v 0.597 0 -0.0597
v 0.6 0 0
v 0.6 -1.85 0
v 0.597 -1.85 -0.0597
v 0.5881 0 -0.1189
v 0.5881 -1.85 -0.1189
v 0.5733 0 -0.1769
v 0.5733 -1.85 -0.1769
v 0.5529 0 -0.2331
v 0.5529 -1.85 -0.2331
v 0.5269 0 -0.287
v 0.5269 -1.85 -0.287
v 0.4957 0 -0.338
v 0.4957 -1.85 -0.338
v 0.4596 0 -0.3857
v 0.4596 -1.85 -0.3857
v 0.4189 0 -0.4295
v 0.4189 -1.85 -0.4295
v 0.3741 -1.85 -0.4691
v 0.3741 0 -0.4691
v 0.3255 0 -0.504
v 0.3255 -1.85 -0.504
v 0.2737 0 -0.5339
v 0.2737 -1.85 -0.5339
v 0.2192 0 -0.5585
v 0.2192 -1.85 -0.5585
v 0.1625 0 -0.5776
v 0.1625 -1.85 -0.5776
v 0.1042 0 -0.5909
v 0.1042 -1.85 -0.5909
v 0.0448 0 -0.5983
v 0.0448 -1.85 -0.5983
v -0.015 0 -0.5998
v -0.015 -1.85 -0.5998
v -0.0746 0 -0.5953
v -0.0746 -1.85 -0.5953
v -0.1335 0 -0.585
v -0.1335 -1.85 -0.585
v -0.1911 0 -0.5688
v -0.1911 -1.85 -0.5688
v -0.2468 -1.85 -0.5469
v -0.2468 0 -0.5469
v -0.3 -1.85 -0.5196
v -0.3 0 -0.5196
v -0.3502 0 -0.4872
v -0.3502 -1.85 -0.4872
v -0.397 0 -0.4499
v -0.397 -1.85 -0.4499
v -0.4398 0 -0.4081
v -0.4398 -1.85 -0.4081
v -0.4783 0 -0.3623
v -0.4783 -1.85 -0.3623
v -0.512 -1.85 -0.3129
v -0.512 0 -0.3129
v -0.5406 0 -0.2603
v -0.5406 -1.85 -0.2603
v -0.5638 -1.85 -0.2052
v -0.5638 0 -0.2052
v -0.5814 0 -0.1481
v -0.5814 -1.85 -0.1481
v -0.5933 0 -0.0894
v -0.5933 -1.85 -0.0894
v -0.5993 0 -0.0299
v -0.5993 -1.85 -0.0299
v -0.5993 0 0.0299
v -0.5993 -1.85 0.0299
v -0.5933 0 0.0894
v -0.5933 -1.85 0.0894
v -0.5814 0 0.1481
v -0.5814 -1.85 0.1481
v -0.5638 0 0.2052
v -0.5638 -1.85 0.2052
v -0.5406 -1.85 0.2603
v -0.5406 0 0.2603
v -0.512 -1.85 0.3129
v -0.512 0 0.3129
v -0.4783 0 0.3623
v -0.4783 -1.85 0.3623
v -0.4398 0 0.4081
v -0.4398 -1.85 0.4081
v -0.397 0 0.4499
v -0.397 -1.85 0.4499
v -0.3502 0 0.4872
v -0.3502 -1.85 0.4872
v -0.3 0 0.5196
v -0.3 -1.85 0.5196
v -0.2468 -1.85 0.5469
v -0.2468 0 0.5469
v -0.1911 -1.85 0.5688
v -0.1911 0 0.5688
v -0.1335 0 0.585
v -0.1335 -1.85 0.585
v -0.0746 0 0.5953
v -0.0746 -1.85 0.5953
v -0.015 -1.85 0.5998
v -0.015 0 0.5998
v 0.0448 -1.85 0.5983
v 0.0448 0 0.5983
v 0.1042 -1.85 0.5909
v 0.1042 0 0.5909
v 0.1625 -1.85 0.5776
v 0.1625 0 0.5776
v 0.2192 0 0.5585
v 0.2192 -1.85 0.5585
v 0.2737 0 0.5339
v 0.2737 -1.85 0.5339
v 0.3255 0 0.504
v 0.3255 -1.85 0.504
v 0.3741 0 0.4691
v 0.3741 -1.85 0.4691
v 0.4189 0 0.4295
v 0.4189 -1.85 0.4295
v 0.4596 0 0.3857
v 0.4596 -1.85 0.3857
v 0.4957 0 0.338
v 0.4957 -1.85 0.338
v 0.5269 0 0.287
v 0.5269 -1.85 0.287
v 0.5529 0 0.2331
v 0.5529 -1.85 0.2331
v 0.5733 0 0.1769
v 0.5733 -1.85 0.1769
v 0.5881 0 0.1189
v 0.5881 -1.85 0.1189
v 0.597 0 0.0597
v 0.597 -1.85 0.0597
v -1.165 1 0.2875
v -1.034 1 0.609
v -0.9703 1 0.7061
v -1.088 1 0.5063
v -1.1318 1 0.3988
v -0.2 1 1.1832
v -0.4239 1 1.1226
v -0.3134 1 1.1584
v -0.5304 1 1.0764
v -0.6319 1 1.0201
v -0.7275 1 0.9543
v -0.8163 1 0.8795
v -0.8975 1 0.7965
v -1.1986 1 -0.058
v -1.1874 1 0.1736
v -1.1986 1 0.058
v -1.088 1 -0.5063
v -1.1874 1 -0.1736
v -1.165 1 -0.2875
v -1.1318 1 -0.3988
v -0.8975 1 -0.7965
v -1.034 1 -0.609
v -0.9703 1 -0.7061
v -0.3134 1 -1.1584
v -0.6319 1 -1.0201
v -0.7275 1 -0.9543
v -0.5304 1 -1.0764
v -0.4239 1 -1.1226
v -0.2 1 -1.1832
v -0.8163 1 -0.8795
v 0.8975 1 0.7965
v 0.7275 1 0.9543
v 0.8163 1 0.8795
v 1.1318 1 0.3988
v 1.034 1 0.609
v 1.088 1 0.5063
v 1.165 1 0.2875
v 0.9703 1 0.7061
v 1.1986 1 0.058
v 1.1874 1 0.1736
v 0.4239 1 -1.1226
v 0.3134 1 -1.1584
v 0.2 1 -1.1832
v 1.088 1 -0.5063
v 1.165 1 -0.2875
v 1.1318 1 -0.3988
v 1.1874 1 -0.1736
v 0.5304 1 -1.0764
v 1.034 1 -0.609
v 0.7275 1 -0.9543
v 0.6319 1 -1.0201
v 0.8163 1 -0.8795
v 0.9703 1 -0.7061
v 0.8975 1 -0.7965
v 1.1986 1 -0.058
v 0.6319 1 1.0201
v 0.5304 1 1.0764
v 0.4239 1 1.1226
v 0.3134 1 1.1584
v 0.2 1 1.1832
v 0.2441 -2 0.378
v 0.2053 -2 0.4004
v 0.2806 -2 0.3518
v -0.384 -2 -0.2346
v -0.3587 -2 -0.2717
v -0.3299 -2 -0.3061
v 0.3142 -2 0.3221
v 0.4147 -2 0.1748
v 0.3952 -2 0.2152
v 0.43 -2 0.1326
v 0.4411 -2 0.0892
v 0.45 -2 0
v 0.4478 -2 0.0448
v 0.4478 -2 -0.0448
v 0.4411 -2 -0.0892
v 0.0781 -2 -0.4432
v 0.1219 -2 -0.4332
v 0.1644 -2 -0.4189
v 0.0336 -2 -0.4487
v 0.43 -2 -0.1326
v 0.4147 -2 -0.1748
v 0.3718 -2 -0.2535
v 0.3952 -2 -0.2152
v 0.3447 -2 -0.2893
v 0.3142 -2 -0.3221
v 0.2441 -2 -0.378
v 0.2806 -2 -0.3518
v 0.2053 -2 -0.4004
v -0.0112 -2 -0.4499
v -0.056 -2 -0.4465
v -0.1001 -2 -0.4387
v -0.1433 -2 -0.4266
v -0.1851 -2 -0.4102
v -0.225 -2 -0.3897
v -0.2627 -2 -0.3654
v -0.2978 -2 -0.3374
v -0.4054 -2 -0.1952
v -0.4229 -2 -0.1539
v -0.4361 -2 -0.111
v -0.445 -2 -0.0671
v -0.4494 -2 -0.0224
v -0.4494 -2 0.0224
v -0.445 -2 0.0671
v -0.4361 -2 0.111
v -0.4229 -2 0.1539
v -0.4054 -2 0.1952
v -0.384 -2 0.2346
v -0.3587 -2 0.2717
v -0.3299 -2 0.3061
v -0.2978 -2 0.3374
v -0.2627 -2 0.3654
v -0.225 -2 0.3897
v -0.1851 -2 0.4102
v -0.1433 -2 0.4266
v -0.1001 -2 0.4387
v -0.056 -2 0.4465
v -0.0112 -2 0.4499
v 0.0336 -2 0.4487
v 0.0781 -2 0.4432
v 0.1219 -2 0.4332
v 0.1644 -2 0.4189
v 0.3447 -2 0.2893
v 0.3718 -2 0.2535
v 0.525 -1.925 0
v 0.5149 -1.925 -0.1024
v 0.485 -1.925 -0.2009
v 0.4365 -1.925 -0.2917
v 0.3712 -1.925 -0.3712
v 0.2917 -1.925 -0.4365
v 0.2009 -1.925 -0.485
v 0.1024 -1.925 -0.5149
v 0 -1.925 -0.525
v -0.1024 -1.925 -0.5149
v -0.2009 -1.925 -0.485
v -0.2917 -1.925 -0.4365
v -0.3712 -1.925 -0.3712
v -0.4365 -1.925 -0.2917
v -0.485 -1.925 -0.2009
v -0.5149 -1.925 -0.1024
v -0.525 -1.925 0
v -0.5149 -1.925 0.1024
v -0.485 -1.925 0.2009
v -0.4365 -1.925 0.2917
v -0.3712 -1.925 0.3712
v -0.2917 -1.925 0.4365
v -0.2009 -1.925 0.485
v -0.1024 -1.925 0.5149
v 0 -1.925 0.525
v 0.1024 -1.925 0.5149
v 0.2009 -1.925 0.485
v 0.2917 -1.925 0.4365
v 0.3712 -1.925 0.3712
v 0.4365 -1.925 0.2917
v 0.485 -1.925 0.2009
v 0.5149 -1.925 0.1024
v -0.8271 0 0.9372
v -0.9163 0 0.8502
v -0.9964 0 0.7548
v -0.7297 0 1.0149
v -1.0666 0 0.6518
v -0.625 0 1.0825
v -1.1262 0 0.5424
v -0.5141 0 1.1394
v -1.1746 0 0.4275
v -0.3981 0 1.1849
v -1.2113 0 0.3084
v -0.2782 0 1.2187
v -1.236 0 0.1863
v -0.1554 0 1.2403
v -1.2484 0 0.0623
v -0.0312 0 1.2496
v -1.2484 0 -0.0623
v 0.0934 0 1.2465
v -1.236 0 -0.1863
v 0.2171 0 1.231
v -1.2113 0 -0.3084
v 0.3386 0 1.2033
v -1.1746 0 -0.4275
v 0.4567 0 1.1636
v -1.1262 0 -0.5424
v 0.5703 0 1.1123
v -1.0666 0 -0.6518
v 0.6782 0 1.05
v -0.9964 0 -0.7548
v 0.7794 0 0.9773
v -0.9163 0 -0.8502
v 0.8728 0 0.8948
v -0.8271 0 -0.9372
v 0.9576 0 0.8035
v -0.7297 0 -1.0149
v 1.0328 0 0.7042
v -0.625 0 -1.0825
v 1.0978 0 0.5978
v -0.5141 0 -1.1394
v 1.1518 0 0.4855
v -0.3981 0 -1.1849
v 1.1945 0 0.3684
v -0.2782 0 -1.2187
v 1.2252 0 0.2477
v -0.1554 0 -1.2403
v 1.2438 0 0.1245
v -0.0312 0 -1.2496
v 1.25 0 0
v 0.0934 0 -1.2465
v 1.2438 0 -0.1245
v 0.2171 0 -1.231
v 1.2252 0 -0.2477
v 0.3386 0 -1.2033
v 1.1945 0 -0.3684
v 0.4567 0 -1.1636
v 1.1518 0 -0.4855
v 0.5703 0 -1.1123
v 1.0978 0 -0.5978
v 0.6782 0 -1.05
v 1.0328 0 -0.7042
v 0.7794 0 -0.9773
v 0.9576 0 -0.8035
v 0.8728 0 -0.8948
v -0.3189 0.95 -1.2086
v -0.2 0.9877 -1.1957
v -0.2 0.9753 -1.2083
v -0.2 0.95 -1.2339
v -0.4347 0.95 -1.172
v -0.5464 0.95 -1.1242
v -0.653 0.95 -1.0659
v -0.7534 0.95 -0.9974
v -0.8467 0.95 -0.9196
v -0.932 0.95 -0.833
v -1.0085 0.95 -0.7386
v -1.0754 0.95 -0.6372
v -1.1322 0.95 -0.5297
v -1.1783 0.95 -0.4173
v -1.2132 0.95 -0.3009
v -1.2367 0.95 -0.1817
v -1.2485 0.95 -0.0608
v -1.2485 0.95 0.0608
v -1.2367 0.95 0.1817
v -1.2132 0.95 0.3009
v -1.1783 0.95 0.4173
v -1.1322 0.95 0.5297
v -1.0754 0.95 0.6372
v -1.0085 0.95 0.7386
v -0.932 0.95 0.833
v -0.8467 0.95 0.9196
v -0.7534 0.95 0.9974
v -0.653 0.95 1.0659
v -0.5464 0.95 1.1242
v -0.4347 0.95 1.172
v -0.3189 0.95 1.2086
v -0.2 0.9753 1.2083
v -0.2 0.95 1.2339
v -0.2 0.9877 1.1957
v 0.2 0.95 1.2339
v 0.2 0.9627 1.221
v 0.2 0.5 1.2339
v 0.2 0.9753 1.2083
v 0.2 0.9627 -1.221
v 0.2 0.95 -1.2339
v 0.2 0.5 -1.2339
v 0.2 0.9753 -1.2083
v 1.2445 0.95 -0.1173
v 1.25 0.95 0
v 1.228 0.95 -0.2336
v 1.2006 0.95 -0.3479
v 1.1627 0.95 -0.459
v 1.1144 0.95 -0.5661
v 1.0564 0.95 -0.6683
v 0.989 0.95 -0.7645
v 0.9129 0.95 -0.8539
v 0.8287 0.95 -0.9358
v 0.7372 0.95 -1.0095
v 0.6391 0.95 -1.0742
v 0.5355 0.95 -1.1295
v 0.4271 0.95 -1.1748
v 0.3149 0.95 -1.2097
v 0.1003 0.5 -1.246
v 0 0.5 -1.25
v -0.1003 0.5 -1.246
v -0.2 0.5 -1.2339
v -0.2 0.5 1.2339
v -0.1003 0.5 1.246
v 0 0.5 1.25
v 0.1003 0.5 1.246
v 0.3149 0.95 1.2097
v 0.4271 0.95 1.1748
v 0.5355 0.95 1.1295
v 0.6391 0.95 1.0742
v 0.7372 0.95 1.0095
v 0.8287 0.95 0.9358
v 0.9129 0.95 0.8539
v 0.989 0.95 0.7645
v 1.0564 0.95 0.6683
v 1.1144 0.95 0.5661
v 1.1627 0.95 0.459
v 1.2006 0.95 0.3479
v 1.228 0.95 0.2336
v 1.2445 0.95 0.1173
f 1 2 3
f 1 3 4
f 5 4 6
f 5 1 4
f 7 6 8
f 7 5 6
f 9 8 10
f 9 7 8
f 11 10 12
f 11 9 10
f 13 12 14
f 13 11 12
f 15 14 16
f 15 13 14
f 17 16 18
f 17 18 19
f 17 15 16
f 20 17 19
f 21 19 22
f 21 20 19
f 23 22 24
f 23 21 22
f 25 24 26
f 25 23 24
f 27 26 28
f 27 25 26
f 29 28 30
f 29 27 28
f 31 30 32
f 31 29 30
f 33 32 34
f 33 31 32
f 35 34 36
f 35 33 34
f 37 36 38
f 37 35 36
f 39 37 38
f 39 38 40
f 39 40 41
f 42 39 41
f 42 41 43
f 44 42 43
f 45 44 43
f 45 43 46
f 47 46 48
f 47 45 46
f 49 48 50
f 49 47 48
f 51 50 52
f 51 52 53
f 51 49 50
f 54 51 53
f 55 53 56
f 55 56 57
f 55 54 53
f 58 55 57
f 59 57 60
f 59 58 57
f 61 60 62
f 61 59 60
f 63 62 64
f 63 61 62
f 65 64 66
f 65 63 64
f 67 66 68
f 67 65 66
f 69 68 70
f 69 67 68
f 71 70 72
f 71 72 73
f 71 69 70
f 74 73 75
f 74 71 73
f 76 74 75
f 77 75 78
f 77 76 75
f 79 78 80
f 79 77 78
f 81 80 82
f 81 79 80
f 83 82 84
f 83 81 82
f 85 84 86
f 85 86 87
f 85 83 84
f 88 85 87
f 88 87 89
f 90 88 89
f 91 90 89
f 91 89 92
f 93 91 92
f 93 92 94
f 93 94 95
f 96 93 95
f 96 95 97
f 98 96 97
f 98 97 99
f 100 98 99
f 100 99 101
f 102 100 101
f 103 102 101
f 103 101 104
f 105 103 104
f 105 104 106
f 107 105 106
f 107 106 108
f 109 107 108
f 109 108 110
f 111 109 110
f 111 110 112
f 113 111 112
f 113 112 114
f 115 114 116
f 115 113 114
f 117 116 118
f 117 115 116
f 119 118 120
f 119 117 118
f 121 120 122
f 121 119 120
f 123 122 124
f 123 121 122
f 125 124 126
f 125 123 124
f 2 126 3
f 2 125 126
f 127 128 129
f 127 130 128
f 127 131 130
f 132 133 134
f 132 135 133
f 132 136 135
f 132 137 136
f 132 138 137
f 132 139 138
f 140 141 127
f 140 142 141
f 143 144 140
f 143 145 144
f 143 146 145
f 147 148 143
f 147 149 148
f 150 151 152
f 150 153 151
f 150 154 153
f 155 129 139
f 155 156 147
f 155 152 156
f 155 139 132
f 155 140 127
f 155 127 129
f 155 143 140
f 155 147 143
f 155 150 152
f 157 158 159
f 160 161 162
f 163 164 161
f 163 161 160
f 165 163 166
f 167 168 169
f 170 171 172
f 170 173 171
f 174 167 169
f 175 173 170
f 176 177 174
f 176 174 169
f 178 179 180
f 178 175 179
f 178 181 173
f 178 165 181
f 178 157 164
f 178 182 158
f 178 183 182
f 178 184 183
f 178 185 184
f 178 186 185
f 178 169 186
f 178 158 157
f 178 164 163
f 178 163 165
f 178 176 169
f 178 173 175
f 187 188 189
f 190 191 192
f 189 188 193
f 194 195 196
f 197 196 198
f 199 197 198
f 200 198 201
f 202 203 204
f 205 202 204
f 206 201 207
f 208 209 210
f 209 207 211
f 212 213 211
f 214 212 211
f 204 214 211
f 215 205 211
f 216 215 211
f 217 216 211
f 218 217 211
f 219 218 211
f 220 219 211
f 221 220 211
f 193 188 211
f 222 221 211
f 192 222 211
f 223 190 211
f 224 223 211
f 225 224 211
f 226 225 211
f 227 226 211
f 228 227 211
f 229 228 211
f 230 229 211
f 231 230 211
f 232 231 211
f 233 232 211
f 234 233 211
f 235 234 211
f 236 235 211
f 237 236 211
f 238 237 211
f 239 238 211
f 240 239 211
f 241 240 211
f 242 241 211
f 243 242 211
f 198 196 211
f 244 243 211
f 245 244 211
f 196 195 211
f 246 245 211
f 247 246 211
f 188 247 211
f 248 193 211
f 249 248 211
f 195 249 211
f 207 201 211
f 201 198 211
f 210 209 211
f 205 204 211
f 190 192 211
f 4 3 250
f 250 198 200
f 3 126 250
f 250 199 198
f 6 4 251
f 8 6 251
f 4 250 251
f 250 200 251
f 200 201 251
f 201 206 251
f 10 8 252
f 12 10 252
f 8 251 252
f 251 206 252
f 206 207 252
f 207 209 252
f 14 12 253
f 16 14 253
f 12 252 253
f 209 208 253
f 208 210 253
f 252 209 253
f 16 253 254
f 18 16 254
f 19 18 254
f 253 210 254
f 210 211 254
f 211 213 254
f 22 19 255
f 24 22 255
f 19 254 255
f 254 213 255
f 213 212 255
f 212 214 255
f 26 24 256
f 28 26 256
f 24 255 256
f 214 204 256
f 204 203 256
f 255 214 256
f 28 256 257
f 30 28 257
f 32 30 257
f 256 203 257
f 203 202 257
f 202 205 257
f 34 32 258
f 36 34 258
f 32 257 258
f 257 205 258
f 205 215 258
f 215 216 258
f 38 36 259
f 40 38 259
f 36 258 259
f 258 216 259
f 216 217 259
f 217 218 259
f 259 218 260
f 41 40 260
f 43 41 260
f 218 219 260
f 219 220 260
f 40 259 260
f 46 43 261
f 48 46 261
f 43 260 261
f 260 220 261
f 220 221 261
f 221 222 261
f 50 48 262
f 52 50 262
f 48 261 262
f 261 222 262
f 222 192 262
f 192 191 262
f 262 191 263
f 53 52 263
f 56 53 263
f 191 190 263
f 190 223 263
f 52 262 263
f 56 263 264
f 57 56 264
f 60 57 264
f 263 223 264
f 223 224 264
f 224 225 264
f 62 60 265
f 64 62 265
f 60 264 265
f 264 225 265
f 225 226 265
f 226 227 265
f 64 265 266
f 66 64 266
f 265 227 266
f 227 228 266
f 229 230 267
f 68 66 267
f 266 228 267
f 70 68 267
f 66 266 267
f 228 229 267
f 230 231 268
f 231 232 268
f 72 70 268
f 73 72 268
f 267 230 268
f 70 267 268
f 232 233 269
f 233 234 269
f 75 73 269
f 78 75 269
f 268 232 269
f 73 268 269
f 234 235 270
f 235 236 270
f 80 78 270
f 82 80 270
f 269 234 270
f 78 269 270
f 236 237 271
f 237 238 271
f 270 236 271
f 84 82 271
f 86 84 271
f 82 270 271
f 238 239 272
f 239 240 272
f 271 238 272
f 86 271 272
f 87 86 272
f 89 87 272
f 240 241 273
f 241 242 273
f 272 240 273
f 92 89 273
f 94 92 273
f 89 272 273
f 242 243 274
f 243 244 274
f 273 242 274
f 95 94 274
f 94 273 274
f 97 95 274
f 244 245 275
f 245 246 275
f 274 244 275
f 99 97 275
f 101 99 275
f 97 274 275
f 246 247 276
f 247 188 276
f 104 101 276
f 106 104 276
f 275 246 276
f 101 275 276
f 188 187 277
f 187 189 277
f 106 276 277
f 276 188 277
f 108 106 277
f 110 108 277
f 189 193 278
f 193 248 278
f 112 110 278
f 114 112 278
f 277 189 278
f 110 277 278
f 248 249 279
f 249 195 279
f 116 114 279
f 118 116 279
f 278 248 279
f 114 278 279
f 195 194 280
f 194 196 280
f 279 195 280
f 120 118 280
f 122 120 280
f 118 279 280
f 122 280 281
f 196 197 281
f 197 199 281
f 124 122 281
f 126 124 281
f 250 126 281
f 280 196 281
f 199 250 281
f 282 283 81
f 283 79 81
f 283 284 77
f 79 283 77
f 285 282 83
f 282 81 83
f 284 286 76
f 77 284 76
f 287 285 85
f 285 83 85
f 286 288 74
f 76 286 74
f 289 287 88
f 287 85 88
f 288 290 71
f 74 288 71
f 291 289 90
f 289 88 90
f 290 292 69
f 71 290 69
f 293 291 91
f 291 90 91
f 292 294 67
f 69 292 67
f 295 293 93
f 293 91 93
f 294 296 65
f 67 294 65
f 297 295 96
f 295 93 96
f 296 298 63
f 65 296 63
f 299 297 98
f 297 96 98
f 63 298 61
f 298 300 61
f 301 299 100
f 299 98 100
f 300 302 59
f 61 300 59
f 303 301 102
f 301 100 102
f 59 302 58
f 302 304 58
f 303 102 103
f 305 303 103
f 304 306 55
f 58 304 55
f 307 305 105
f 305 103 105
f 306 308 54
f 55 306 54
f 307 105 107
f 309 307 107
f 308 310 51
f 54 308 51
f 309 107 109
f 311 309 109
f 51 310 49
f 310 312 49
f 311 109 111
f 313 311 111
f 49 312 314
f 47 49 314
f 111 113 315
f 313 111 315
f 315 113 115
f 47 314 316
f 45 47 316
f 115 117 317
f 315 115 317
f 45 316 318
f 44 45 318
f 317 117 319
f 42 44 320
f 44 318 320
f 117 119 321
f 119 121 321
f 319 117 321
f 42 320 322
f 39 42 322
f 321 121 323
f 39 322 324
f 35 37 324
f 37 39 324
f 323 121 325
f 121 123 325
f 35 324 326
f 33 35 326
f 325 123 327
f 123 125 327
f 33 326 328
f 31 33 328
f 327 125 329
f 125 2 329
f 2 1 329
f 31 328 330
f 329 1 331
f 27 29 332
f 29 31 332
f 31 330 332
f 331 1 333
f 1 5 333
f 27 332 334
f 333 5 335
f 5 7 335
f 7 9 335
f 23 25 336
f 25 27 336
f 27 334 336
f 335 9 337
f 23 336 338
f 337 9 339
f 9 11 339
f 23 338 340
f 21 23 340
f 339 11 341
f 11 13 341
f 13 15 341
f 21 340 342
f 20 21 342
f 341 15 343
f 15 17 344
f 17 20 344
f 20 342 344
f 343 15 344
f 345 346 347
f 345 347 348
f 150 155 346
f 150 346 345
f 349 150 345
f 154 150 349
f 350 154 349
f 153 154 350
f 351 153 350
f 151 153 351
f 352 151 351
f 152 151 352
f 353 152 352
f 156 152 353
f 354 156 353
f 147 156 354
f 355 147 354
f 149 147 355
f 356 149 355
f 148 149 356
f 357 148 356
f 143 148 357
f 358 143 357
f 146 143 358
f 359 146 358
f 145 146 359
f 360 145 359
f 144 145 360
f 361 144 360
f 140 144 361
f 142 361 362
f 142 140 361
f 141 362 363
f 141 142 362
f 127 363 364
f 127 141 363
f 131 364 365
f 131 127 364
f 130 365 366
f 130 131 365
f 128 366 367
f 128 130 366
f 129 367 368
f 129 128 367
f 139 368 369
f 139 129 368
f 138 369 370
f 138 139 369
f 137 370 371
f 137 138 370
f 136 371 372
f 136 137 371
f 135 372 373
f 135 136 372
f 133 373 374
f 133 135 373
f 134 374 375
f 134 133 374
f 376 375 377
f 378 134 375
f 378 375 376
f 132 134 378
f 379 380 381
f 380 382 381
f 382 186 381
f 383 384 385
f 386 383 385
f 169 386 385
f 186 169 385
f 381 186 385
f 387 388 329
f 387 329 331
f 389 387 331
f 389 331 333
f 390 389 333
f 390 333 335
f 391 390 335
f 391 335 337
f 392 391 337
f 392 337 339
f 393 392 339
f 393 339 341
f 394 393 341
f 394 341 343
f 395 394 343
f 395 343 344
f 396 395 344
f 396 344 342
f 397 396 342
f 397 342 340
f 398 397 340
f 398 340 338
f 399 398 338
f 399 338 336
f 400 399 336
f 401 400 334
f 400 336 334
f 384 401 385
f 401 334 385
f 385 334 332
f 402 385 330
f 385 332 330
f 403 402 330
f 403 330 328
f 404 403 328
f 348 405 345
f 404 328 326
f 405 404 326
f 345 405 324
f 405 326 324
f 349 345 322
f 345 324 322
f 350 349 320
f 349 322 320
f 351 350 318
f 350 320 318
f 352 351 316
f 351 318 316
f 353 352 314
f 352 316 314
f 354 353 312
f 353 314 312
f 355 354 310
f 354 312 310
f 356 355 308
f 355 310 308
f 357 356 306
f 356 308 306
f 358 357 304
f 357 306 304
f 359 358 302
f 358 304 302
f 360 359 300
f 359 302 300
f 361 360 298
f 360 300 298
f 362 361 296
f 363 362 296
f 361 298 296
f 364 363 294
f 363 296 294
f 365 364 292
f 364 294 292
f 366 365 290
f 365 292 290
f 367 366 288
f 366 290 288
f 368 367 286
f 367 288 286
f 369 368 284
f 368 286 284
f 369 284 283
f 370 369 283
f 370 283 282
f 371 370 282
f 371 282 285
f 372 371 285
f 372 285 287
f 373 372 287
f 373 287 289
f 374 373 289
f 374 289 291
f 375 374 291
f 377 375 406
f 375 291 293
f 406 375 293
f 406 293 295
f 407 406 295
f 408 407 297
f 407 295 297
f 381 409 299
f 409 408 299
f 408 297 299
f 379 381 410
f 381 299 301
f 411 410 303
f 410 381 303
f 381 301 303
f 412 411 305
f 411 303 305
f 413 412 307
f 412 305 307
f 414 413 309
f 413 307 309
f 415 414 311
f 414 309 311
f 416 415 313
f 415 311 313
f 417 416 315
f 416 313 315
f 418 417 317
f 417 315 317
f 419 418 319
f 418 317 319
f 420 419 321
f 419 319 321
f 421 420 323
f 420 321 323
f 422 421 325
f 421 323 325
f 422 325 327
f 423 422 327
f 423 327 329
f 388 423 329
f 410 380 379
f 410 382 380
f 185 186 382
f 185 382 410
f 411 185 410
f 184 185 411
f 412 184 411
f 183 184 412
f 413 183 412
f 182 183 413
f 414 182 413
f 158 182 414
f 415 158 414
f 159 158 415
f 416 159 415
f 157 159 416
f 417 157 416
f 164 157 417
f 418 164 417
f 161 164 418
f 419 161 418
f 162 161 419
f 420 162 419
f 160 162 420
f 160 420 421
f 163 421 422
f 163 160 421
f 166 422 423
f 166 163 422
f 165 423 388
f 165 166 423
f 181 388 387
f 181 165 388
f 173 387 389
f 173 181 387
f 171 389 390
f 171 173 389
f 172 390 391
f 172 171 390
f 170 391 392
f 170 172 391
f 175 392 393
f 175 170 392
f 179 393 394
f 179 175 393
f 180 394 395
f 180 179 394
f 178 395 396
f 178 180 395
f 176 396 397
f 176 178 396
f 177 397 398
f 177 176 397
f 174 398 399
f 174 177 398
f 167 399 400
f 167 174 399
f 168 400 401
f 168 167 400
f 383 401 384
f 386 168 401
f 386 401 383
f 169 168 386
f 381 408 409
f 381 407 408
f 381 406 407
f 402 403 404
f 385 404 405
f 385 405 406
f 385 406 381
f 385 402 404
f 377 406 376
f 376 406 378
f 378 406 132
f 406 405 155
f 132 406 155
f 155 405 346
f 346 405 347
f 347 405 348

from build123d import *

# Parameters (mm, degrees)
SKETCH1_R               = 1.25
BOSS_EXTRUDE1_DEPTH     = 1
SKETCH2_R               = 0.6
BOSS_EXTRUDE2_DEPTH     = 2
CHAMFER1_SIZE           = 0.05
CHAMFER2_SIZE           = 0.15
CUT_EXTRUDE1_DEPTH      = 2.25
CUT_EXTRUDE1_DEPTH_BACK = 2.25


with BuildPart() as part:
    # Sketch1 → Boss-Extrude1 (new body)
    with BuildSketch(Plane(origin=(0, 0, 0), x_dir=(1, 0, 0), z_dir=(0, 1, 0))):
        Circle(SKETCH1_R)
    extrude(amount=BOSS_EXTRUDE1_DEPTH)

    # Sketch2 → Boss-Extrude2 (add)
    with BuildSketch(Plane(origin=(0, 0, 0), x_dir=(1, 0, 0), z_dir=(0, 1, 0))):
        Circle(SKETCH2_R)
    extrude(amount=-BOSS_EXTRUDE2_DEPTH)

    # Chamfer1
    chamfer1_edges = [part.edges().sort_by_distance(p)[0] for p in [
        (-1.25, 1, 0),
    ]]
    chamfer(chamfer1_edges, length=CHAMFER1_SIZE)

    # Chamfer2
    chamfer2_edges = [part.edges().sort_by_distance(p)[0] for p in [
        (-0.6, -2, 0),
    ]]
    chamfer(chamfer2_edges, length=CHAMFER2_SIZE)

    # Sketch3 → Cut-Extrude1 (cut, two sides)
    with BuildSketch(Plane.XY) as cut_extrude1_sk:
        Polygon((-0.2, 1), (0, 1), (0.2, 1), (0.2, 0.5), (0, 0.5), (-0.2, 0.5), align=None)
    extrude(amount=CUT_EXTRUDE1_DEPTH, mode=Mode.SUBTRACT)
    extrude(cut_extrude1_sk.sketch, amount=-CUT_EXTRUDE1_DEPTH_BACK, mode=Mode.SUBTRACT)


solid = part.part
